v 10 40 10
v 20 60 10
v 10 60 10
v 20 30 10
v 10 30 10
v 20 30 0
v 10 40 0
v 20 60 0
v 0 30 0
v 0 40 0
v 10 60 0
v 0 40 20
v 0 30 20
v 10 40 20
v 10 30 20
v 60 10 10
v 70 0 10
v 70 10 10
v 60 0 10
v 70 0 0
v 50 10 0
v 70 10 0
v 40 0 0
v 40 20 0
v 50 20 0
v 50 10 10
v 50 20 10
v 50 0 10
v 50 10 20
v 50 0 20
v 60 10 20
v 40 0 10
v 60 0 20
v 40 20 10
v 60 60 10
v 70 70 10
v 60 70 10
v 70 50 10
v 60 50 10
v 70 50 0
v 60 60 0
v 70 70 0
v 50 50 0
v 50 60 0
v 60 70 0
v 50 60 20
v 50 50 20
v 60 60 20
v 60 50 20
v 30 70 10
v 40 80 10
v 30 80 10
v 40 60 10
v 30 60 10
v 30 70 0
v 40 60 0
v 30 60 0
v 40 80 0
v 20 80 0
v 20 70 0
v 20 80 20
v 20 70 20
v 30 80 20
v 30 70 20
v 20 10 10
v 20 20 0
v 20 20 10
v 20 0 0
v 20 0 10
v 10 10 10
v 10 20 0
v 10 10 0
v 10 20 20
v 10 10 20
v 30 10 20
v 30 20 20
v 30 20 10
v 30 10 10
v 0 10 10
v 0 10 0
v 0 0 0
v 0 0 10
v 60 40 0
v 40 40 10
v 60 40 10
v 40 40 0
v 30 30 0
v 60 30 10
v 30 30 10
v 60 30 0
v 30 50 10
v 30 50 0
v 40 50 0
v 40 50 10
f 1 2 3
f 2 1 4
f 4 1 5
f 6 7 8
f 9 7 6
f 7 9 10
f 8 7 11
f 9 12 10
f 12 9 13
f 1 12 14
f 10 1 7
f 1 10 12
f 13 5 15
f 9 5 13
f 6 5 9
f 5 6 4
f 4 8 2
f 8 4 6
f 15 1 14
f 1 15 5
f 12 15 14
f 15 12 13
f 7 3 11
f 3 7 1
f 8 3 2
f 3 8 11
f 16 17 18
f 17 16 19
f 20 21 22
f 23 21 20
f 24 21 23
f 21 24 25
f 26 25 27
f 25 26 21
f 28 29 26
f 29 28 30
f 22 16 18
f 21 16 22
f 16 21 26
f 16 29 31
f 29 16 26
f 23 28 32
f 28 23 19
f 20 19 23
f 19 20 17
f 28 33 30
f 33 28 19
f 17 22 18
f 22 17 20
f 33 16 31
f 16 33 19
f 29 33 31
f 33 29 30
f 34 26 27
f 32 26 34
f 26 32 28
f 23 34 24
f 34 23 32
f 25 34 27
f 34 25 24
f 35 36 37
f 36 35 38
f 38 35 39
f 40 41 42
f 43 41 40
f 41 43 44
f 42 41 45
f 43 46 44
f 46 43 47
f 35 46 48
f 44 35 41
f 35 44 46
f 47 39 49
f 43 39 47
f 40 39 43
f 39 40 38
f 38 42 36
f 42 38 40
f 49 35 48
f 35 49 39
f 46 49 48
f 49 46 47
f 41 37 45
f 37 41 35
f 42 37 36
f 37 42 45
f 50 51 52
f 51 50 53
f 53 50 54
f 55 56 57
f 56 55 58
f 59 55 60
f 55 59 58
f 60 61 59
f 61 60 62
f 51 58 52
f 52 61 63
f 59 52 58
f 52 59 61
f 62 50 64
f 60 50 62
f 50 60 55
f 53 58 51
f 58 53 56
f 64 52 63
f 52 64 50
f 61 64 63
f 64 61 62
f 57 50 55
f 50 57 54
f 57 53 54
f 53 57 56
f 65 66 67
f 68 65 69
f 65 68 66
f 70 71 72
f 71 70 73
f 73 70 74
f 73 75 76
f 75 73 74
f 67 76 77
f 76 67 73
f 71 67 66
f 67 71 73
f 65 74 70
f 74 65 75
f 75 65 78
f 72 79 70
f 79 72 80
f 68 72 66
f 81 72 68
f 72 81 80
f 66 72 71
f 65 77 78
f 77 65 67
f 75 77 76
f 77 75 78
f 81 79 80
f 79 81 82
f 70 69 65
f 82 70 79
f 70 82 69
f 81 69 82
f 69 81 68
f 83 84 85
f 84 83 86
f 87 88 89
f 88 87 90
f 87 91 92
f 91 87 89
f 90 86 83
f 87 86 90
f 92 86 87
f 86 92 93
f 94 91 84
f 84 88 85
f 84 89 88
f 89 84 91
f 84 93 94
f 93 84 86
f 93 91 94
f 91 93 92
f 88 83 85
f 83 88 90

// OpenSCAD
//cubo negro//

//LL
module LL(unidad){
     cube(unidad);
     translate ([unidad,0,0]){
       cube(unidad);}
     translate ([0,0,unidad]){
       cube(unidad);}
          }       
//piezaT    
module piezaT(unidad){
  LL(unidad);
    translate([-unidad,0,0]){
     cube([unidad,2*unidad,unidad]);}}
     
//gemeloD
module gemeloD(unidad){
  LL(unidad);
   translate([unidad,unidad,0]){
     cube(unidad);}}         
     
//gemeloI
module gemeloI(unidad){
   LL(unidad);
    translate([unidad,-unidad,0]){
     cube(unidad);}}     

//piezaZ     
module piezaZ(unidad){  
    LL(unidad);
    translate([unidad,-unidad,-unidad]){
     cube([unidad,unidad,2*unidad]);}}  

//piezaL
module piezaL(unidad){
    LL(unidad);
    translate([2*unidad,0,0]){
     cube(unidad);}} 
    
//piezaGamma
module piezaGamma(unidad){
 LL(unidad);
  translate([unidad,unidad,0]){
     cube([unidad,2*unidad,unidad]);}  
 }
  
translate([0,30,0]){       
piezaGamma(10);} 
translate([50,0,0]){ 
piezaT(10);}
translate([50,50,0]){
gemeloD(10);}
translate([20,70,0]){ 
gemeloI(10);}        
translate([10,10,20]){ 
  rotate([0,90,0]){
  piezaZ(10);}}  
translate([30,30,10]){ 
  rotate([-90,0,0]){
      piezaL(10);}}          
